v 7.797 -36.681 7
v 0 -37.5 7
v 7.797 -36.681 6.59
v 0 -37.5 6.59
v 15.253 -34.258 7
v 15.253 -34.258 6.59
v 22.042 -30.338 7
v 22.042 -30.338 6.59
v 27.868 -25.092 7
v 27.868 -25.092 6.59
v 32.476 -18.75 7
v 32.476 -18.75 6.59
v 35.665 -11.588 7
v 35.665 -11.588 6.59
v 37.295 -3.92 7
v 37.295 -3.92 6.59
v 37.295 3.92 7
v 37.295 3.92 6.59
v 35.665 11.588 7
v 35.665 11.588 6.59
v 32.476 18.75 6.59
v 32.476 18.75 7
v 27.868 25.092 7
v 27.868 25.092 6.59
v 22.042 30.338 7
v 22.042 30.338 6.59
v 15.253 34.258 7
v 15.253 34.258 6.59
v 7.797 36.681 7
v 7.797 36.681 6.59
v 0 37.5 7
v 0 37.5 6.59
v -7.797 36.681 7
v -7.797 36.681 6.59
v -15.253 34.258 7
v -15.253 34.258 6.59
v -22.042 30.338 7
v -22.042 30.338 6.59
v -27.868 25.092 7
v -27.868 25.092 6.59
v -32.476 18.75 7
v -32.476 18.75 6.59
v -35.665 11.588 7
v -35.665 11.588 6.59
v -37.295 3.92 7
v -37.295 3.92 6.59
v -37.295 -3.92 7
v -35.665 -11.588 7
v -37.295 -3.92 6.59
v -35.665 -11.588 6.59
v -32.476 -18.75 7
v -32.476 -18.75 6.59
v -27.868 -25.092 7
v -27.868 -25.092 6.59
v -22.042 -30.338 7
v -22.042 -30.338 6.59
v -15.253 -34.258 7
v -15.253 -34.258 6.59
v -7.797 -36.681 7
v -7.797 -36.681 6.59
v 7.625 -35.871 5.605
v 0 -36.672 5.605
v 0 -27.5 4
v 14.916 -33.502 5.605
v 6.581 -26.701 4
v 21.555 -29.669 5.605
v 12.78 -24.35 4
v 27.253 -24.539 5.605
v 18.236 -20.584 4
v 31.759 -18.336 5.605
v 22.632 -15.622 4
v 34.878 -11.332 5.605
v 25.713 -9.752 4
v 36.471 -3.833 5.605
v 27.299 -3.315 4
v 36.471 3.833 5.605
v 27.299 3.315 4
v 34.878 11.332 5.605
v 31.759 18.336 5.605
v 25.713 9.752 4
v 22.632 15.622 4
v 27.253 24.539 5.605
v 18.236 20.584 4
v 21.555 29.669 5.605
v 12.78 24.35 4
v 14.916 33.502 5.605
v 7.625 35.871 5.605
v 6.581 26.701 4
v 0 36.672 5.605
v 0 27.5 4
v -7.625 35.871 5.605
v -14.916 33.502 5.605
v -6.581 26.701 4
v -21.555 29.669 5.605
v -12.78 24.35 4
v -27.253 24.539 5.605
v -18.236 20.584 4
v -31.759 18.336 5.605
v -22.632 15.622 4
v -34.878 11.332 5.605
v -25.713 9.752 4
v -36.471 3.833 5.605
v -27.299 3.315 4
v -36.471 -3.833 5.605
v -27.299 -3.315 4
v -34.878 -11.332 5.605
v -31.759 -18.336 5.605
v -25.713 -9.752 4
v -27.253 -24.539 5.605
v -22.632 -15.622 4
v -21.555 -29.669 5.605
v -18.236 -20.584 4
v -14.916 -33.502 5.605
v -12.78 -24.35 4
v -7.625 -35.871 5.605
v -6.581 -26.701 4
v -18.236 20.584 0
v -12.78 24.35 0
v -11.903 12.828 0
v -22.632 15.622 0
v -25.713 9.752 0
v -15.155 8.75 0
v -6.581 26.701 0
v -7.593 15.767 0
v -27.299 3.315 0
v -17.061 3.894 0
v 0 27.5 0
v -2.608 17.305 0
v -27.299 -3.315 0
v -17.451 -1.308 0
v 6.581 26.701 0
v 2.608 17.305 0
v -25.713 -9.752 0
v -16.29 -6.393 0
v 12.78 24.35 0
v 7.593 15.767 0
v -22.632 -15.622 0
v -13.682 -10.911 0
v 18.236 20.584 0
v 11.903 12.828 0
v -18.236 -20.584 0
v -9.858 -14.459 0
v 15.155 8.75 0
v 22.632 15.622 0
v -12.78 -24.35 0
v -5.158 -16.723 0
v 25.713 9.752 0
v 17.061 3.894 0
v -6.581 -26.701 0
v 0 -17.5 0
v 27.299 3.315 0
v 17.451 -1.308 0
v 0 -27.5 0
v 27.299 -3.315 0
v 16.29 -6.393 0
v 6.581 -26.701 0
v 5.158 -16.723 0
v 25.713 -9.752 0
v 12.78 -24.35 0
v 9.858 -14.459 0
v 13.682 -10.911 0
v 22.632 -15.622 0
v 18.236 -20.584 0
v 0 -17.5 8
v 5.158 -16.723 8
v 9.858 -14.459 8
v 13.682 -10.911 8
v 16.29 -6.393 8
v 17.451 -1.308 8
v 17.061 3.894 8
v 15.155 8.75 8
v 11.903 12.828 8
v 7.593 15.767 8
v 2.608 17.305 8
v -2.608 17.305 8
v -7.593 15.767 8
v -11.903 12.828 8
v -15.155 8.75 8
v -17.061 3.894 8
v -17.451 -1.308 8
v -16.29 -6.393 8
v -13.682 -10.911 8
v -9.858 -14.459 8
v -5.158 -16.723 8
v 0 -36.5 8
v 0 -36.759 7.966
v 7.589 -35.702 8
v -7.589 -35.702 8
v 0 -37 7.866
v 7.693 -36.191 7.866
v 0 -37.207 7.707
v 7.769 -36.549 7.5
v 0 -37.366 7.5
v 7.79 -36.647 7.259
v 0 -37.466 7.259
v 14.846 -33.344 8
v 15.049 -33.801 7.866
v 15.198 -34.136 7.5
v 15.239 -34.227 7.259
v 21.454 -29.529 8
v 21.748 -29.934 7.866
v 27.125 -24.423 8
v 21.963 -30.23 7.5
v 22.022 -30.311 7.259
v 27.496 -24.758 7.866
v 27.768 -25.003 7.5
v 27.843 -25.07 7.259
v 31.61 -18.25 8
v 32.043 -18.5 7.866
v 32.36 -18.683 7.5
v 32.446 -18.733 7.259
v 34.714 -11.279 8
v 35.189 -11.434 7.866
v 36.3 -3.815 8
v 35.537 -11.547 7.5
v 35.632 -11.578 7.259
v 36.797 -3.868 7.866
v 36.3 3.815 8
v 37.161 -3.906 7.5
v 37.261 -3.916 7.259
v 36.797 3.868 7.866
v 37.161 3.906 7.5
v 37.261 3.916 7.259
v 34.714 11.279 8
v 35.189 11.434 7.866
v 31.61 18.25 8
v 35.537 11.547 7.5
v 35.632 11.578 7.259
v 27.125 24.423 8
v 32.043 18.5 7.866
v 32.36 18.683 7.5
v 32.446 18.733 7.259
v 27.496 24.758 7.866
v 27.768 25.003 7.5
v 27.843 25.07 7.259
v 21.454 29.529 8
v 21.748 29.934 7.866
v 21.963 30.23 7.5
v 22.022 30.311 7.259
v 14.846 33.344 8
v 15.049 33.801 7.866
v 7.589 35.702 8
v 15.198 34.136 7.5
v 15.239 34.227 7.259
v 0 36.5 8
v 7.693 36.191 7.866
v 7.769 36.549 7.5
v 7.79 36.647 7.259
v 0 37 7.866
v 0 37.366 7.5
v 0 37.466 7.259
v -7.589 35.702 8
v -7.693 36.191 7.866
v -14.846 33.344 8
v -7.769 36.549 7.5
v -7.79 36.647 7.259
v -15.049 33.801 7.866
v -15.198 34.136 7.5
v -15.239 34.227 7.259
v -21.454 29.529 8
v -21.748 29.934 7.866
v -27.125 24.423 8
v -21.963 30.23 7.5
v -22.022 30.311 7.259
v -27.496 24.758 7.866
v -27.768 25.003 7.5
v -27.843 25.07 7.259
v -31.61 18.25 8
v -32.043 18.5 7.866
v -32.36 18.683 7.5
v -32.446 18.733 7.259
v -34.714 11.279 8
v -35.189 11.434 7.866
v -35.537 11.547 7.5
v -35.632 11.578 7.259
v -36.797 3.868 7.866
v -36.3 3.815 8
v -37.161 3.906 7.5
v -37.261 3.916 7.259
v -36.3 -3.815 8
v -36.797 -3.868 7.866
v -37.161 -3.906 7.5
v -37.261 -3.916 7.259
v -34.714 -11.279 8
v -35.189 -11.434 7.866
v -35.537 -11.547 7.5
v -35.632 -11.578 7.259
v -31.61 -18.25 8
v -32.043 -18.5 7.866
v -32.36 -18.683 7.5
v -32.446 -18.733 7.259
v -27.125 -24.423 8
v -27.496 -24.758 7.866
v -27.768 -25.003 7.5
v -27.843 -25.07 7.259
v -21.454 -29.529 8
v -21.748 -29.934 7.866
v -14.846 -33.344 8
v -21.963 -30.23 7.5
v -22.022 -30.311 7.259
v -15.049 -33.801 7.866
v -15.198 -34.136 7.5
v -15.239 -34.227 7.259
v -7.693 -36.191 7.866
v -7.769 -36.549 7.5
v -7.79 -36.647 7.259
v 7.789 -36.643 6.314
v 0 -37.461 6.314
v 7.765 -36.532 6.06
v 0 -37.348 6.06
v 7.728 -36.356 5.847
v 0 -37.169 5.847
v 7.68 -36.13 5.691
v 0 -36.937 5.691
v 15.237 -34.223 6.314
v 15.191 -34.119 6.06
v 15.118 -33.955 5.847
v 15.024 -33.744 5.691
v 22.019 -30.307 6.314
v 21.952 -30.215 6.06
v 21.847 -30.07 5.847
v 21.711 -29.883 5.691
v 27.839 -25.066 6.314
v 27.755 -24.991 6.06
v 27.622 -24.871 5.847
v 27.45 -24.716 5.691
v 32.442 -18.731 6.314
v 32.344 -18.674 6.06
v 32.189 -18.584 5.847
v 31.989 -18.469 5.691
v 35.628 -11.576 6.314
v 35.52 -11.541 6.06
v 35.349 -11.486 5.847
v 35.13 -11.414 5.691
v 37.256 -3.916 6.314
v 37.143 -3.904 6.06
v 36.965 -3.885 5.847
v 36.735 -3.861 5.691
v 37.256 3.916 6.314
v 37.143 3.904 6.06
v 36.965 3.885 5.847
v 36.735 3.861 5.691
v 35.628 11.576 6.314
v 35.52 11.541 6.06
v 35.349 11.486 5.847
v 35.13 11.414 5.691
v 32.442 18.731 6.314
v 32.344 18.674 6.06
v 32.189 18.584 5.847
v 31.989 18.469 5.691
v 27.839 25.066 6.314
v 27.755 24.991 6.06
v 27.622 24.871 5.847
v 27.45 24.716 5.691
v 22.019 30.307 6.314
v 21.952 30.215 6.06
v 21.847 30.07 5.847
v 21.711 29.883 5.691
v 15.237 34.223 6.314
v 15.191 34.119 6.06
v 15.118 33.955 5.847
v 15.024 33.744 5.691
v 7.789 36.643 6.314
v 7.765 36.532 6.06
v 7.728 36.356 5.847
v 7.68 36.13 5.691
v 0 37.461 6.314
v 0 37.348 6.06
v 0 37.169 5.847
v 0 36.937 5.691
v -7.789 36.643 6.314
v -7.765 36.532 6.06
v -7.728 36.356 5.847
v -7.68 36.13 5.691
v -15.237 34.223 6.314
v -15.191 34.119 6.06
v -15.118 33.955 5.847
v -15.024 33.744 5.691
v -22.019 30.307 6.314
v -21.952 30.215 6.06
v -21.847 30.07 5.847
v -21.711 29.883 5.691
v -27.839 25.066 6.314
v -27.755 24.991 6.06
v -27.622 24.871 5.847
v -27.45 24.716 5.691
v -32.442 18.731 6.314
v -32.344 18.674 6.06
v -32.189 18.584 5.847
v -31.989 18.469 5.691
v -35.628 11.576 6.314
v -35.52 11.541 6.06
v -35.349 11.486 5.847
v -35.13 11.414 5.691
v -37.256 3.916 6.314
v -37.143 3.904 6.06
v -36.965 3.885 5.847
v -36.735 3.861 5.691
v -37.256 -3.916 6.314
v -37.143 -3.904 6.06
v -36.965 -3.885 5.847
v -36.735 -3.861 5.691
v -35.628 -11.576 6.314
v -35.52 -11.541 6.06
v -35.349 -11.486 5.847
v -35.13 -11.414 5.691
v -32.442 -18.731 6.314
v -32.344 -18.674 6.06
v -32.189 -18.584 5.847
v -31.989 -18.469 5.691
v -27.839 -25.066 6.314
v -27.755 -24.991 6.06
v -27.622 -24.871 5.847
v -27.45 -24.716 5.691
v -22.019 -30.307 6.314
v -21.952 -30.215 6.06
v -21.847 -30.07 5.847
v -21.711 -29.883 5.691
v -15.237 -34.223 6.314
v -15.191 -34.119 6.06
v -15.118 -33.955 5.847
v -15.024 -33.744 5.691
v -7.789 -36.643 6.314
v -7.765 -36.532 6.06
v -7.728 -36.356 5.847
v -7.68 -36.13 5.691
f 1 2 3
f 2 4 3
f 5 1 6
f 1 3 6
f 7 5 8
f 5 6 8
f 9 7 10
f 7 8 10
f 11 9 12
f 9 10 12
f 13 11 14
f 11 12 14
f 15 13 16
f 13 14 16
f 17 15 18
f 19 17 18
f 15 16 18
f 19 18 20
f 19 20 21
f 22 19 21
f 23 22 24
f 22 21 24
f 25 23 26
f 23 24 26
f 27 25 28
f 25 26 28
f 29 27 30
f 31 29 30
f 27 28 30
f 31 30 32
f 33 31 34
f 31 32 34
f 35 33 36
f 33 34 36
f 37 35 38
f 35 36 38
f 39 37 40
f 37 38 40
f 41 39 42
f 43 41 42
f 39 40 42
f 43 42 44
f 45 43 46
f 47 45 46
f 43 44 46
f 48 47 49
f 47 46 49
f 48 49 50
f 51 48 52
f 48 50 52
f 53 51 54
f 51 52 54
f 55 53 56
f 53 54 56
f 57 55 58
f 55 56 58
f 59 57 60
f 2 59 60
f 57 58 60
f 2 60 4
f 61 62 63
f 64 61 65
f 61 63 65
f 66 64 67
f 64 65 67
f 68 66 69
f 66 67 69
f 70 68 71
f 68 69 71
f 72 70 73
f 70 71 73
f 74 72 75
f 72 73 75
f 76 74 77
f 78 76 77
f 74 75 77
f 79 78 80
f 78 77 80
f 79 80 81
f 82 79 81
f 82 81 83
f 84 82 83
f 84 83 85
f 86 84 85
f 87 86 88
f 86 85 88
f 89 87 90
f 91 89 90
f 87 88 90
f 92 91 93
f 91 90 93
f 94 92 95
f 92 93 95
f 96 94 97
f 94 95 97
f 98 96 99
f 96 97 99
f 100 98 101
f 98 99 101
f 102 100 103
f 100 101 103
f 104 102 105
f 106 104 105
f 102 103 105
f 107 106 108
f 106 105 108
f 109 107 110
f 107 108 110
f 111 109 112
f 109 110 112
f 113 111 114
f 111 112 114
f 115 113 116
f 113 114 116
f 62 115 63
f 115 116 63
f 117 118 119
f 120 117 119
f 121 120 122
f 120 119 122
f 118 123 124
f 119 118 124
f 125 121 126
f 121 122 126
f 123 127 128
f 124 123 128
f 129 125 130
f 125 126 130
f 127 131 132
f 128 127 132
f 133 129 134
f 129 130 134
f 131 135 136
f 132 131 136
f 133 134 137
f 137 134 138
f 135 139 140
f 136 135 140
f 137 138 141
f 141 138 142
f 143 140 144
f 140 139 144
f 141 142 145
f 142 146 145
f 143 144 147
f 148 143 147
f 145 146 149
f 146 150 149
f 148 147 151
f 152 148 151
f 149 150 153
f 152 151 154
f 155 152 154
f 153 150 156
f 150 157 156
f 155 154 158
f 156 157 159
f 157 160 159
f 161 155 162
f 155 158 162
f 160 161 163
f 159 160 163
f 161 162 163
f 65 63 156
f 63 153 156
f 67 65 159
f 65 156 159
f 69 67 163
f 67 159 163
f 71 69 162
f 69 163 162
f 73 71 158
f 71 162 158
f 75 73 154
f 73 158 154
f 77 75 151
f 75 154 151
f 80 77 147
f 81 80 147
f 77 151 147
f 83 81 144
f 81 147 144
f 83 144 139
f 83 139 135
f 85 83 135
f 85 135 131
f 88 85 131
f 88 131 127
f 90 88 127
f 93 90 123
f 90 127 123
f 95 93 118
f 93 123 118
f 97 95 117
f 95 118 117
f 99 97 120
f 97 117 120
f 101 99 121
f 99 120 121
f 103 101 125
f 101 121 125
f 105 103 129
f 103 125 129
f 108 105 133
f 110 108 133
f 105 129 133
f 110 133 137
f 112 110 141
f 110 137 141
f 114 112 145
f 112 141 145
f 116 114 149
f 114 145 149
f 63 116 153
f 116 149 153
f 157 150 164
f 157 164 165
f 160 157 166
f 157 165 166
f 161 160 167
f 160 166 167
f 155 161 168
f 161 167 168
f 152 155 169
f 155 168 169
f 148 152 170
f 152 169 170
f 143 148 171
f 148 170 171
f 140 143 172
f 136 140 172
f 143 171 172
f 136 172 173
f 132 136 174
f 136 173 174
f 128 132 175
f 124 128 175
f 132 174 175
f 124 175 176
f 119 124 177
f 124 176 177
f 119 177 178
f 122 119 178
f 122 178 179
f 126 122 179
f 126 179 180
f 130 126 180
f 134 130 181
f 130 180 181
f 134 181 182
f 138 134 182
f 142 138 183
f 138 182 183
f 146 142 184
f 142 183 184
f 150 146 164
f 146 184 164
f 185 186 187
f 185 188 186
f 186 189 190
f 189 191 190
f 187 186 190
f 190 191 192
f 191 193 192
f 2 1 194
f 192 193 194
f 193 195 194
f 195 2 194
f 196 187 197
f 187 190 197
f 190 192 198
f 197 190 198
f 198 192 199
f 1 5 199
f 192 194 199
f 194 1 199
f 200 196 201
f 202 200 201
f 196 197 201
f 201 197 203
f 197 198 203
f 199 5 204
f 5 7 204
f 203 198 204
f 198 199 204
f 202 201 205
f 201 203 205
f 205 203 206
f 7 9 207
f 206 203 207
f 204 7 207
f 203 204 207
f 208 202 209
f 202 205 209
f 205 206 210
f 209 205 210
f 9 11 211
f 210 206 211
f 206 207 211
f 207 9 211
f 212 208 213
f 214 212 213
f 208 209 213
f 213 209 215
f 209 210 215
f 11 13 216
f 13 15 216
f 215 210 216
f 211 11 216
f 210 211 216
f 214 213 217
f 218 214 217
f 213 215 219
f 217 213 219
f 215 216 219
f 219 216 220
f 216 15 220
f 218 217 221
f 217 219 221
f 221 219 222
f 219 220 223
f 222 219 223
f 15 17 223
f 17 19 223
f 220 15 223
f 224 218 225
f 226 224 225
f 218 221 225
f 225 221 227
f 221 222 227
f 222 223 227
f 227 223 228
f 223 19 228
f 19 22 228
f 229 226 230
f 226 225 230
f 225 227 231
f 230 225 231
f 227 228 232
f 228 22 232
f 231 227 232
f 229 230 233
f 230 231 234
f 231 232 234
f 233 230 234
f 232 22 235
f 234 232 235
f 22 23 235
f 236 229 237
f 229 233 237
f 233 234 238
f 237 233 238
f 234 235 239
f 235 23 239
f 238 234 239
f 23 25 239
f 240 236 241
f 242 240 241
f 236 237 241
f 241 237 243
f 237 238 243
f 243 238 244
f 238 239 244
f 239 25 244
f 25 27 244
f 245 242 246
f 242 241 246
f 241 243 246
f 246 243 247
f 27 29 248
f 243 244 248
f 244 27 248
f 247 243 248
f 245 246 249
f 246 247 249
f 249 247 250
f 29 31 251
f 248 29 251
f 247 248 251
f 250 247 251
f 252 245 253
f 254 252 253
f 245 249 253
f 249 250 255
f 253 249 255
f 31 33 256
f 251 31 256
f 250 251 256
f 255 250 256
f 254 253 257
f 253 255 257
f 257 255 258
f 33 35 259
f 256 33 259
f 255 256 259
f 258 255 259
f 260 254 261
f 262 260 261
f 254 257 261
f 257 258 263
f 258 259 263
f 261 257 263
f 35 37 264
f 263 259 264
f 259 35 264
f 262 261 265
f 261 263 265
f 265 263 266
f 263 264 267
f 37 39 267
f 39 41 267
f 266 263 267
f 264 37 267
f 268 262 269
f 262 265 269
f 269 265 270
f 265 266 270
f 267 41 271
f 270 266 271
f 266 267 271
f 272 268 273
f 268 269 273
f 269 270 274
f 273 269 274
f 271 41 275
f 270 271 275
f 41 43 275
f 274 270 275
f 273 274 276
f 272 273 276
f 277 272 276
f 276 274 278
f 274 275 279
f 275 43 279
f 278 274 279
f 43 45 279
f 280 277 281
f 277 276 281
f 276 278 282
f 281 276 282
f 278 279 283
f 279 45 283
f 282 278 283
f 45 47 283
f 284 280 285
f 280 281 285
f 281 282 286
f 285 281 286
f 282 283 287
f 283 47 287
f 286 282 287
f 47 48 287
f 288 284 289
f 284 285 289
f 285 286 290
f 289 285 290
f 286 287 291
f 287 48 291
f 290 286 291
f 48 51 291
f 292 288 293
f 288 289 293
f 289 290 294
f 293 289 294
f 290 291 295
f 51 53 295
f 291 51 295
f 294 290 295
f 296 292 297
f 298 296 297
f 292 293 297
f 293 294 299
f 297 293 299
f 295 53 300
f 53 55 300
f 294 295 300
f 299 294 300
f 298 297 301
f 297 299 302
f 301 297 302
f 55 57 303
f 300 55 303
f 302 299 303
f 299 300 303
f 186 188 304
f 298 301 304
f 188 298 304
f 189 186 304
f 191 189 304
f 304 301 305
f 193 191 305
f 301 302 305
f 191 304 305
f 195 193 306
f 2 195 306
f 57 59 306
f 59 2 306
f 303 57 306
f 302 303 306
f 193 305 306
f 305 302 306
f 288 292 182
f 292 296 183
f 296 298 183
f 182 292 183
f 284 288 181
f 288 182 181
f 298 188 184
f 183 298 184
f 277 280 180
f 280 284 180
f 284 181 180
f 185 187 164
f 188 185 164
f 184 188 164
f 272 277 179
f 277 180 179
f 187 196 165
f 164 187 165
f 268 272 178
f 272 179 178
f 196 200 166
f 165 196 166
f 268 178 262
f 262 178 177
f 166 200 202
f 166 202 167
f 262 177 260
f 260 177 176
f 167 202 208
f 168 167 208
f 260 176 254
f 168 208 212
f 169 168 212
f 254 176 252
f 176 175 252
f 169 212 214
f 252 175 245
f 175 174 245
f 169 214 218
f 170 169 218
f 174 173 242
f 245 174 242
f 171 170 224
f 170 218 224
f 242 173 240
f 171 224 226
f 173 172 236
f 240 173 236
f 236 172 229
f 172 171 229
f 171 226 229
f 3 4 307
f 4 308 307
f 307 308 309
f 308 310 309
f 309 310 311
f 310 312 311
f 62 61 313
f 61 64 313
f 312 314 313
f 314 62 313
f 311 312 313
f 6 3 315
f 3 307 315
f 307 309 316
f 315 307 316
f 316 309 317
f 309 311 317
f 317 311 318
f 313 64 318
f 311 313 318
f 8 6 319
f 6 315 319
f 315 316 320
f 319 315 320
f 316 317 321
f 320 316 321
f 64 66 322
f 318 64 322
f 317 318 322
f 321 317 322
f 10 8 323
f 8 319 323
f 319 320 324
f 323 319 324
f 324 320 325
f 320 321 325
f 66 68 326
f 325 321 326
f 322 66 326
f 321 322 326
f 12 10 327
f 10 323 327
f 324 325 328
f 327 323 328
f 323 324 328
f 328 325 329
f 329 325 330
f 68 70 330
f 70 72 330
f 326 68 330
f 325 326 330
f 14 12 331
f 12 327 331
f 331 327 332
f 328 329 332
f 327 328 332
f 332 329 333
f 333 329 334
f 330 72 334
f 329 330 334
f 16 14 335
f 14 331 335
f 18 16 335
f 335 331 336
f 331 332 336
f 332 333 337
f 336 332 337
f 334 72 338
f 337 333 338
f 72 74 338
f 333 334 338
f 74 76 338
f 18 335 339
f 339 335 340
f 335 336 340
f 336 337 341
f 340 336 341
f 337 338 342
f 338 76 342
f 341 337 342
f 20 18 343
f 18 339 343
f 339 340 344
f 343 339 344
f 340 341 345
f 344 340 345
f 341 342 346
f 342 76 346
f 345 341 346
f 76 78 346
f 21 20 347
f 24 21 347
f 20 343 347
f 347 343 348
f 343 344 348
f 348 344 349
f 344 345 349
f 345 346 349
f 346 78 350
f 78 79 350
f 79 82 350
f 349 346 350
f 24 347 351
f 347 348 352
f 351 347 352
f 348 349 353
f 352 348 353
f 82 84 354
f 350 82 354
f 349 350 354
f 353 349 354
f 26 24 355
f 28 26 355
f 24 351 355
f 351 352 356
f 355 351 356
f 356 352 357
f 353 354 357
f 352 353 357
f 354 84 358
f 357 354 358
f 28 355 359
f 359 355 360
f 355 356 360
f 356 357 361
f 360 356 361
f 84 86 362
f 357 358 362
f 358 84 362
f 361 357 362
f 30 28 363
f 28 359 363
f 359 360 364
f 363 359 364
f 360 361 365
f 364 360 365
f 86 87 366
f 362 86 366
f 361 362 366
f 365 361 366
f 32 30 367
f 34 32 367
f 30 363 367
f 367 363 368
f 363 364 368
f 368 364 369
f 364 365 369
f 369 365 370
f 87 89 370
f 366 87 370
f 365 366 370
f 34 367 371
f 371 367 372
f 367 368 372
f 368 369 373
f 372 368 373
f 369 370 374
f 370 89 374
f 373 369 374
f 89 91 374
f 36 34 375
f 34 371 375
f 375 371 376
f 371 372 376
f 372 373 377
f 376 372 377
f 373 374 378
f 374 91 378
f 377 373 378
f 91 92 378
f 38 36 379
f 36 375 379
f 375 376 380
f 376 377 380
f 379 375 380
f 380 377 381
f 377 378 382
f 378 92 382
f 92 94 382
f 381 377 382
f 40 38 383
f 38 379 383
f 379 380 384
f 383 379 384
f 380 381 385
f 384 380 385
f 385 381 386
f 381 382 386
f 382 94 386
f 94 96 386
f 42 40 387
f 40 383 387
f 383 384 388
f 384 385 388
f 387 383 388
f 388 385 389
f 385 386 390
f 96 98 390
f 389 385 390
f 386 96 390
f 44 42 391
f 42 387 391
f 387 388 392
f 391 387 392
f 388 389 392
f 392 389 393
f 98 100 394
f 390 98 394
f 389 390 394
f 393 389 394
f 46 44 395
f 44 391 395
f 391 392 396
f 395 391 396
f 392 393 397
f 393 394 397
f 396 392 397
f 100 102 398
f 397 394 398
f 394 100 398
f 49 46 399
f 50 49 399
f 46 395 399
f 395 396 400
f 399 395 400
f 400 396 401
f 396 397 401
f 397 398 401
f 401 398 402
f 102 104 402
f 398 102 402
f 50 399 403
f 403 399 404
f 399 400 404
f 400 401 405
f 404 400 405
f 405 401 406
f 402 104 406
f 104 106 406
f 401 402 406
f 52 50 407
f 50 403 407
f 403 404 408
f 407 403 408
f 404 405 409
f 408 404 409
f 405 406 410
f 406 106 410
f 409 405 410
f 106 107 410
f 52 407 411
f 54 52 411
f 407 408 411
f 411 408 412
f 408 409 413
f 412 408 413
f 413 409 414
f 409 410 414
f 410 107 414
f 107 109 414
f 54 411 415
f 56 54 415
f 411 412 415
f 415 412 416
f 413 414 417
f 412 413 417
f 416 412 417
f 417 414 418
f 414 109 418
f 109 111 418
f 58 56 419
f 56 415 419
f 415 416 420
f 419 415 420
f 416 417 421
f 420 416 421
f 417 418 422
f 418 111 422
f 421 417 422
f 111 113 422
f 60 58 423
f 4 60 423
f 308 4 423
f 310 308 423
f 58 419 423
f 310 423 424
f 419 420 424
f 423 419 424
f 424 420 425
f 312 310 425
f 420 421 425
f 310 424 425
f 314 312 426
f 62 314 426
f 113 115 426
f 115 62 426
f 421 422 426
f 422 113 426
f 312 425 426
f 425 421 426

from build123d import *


with BuildPart() as f1:
    # F0 (on Right) → F1 (revolve)
    with BuildSketch(Plane.YZ):
        with BuildLine():
            Line((-27.5, 4), (-27.5, 0))
            Line((-27.5, 0), (-17.5, 0))
            Line((-17.5, 0), (-17.5, 8))
            Line((-17.5, 8), (-36.5, 8))
            ThreePointArc((-36.5, 8), (-37.207107, 7.707107), (-37.5, 7))
            Line((-37.5, 7), (-37.5, 6.590197))
            ThreePointArc((-37.5, 6.590197), (-37.265631, 5.946916), (-36.67238, 5.605167))
            Line((-36.67238, 5.605167), (-27.5, 4))
        make_face()
    revolve(axis=Axis((0, 0, 4), (0, 0, 1)))


solid = f1.part
